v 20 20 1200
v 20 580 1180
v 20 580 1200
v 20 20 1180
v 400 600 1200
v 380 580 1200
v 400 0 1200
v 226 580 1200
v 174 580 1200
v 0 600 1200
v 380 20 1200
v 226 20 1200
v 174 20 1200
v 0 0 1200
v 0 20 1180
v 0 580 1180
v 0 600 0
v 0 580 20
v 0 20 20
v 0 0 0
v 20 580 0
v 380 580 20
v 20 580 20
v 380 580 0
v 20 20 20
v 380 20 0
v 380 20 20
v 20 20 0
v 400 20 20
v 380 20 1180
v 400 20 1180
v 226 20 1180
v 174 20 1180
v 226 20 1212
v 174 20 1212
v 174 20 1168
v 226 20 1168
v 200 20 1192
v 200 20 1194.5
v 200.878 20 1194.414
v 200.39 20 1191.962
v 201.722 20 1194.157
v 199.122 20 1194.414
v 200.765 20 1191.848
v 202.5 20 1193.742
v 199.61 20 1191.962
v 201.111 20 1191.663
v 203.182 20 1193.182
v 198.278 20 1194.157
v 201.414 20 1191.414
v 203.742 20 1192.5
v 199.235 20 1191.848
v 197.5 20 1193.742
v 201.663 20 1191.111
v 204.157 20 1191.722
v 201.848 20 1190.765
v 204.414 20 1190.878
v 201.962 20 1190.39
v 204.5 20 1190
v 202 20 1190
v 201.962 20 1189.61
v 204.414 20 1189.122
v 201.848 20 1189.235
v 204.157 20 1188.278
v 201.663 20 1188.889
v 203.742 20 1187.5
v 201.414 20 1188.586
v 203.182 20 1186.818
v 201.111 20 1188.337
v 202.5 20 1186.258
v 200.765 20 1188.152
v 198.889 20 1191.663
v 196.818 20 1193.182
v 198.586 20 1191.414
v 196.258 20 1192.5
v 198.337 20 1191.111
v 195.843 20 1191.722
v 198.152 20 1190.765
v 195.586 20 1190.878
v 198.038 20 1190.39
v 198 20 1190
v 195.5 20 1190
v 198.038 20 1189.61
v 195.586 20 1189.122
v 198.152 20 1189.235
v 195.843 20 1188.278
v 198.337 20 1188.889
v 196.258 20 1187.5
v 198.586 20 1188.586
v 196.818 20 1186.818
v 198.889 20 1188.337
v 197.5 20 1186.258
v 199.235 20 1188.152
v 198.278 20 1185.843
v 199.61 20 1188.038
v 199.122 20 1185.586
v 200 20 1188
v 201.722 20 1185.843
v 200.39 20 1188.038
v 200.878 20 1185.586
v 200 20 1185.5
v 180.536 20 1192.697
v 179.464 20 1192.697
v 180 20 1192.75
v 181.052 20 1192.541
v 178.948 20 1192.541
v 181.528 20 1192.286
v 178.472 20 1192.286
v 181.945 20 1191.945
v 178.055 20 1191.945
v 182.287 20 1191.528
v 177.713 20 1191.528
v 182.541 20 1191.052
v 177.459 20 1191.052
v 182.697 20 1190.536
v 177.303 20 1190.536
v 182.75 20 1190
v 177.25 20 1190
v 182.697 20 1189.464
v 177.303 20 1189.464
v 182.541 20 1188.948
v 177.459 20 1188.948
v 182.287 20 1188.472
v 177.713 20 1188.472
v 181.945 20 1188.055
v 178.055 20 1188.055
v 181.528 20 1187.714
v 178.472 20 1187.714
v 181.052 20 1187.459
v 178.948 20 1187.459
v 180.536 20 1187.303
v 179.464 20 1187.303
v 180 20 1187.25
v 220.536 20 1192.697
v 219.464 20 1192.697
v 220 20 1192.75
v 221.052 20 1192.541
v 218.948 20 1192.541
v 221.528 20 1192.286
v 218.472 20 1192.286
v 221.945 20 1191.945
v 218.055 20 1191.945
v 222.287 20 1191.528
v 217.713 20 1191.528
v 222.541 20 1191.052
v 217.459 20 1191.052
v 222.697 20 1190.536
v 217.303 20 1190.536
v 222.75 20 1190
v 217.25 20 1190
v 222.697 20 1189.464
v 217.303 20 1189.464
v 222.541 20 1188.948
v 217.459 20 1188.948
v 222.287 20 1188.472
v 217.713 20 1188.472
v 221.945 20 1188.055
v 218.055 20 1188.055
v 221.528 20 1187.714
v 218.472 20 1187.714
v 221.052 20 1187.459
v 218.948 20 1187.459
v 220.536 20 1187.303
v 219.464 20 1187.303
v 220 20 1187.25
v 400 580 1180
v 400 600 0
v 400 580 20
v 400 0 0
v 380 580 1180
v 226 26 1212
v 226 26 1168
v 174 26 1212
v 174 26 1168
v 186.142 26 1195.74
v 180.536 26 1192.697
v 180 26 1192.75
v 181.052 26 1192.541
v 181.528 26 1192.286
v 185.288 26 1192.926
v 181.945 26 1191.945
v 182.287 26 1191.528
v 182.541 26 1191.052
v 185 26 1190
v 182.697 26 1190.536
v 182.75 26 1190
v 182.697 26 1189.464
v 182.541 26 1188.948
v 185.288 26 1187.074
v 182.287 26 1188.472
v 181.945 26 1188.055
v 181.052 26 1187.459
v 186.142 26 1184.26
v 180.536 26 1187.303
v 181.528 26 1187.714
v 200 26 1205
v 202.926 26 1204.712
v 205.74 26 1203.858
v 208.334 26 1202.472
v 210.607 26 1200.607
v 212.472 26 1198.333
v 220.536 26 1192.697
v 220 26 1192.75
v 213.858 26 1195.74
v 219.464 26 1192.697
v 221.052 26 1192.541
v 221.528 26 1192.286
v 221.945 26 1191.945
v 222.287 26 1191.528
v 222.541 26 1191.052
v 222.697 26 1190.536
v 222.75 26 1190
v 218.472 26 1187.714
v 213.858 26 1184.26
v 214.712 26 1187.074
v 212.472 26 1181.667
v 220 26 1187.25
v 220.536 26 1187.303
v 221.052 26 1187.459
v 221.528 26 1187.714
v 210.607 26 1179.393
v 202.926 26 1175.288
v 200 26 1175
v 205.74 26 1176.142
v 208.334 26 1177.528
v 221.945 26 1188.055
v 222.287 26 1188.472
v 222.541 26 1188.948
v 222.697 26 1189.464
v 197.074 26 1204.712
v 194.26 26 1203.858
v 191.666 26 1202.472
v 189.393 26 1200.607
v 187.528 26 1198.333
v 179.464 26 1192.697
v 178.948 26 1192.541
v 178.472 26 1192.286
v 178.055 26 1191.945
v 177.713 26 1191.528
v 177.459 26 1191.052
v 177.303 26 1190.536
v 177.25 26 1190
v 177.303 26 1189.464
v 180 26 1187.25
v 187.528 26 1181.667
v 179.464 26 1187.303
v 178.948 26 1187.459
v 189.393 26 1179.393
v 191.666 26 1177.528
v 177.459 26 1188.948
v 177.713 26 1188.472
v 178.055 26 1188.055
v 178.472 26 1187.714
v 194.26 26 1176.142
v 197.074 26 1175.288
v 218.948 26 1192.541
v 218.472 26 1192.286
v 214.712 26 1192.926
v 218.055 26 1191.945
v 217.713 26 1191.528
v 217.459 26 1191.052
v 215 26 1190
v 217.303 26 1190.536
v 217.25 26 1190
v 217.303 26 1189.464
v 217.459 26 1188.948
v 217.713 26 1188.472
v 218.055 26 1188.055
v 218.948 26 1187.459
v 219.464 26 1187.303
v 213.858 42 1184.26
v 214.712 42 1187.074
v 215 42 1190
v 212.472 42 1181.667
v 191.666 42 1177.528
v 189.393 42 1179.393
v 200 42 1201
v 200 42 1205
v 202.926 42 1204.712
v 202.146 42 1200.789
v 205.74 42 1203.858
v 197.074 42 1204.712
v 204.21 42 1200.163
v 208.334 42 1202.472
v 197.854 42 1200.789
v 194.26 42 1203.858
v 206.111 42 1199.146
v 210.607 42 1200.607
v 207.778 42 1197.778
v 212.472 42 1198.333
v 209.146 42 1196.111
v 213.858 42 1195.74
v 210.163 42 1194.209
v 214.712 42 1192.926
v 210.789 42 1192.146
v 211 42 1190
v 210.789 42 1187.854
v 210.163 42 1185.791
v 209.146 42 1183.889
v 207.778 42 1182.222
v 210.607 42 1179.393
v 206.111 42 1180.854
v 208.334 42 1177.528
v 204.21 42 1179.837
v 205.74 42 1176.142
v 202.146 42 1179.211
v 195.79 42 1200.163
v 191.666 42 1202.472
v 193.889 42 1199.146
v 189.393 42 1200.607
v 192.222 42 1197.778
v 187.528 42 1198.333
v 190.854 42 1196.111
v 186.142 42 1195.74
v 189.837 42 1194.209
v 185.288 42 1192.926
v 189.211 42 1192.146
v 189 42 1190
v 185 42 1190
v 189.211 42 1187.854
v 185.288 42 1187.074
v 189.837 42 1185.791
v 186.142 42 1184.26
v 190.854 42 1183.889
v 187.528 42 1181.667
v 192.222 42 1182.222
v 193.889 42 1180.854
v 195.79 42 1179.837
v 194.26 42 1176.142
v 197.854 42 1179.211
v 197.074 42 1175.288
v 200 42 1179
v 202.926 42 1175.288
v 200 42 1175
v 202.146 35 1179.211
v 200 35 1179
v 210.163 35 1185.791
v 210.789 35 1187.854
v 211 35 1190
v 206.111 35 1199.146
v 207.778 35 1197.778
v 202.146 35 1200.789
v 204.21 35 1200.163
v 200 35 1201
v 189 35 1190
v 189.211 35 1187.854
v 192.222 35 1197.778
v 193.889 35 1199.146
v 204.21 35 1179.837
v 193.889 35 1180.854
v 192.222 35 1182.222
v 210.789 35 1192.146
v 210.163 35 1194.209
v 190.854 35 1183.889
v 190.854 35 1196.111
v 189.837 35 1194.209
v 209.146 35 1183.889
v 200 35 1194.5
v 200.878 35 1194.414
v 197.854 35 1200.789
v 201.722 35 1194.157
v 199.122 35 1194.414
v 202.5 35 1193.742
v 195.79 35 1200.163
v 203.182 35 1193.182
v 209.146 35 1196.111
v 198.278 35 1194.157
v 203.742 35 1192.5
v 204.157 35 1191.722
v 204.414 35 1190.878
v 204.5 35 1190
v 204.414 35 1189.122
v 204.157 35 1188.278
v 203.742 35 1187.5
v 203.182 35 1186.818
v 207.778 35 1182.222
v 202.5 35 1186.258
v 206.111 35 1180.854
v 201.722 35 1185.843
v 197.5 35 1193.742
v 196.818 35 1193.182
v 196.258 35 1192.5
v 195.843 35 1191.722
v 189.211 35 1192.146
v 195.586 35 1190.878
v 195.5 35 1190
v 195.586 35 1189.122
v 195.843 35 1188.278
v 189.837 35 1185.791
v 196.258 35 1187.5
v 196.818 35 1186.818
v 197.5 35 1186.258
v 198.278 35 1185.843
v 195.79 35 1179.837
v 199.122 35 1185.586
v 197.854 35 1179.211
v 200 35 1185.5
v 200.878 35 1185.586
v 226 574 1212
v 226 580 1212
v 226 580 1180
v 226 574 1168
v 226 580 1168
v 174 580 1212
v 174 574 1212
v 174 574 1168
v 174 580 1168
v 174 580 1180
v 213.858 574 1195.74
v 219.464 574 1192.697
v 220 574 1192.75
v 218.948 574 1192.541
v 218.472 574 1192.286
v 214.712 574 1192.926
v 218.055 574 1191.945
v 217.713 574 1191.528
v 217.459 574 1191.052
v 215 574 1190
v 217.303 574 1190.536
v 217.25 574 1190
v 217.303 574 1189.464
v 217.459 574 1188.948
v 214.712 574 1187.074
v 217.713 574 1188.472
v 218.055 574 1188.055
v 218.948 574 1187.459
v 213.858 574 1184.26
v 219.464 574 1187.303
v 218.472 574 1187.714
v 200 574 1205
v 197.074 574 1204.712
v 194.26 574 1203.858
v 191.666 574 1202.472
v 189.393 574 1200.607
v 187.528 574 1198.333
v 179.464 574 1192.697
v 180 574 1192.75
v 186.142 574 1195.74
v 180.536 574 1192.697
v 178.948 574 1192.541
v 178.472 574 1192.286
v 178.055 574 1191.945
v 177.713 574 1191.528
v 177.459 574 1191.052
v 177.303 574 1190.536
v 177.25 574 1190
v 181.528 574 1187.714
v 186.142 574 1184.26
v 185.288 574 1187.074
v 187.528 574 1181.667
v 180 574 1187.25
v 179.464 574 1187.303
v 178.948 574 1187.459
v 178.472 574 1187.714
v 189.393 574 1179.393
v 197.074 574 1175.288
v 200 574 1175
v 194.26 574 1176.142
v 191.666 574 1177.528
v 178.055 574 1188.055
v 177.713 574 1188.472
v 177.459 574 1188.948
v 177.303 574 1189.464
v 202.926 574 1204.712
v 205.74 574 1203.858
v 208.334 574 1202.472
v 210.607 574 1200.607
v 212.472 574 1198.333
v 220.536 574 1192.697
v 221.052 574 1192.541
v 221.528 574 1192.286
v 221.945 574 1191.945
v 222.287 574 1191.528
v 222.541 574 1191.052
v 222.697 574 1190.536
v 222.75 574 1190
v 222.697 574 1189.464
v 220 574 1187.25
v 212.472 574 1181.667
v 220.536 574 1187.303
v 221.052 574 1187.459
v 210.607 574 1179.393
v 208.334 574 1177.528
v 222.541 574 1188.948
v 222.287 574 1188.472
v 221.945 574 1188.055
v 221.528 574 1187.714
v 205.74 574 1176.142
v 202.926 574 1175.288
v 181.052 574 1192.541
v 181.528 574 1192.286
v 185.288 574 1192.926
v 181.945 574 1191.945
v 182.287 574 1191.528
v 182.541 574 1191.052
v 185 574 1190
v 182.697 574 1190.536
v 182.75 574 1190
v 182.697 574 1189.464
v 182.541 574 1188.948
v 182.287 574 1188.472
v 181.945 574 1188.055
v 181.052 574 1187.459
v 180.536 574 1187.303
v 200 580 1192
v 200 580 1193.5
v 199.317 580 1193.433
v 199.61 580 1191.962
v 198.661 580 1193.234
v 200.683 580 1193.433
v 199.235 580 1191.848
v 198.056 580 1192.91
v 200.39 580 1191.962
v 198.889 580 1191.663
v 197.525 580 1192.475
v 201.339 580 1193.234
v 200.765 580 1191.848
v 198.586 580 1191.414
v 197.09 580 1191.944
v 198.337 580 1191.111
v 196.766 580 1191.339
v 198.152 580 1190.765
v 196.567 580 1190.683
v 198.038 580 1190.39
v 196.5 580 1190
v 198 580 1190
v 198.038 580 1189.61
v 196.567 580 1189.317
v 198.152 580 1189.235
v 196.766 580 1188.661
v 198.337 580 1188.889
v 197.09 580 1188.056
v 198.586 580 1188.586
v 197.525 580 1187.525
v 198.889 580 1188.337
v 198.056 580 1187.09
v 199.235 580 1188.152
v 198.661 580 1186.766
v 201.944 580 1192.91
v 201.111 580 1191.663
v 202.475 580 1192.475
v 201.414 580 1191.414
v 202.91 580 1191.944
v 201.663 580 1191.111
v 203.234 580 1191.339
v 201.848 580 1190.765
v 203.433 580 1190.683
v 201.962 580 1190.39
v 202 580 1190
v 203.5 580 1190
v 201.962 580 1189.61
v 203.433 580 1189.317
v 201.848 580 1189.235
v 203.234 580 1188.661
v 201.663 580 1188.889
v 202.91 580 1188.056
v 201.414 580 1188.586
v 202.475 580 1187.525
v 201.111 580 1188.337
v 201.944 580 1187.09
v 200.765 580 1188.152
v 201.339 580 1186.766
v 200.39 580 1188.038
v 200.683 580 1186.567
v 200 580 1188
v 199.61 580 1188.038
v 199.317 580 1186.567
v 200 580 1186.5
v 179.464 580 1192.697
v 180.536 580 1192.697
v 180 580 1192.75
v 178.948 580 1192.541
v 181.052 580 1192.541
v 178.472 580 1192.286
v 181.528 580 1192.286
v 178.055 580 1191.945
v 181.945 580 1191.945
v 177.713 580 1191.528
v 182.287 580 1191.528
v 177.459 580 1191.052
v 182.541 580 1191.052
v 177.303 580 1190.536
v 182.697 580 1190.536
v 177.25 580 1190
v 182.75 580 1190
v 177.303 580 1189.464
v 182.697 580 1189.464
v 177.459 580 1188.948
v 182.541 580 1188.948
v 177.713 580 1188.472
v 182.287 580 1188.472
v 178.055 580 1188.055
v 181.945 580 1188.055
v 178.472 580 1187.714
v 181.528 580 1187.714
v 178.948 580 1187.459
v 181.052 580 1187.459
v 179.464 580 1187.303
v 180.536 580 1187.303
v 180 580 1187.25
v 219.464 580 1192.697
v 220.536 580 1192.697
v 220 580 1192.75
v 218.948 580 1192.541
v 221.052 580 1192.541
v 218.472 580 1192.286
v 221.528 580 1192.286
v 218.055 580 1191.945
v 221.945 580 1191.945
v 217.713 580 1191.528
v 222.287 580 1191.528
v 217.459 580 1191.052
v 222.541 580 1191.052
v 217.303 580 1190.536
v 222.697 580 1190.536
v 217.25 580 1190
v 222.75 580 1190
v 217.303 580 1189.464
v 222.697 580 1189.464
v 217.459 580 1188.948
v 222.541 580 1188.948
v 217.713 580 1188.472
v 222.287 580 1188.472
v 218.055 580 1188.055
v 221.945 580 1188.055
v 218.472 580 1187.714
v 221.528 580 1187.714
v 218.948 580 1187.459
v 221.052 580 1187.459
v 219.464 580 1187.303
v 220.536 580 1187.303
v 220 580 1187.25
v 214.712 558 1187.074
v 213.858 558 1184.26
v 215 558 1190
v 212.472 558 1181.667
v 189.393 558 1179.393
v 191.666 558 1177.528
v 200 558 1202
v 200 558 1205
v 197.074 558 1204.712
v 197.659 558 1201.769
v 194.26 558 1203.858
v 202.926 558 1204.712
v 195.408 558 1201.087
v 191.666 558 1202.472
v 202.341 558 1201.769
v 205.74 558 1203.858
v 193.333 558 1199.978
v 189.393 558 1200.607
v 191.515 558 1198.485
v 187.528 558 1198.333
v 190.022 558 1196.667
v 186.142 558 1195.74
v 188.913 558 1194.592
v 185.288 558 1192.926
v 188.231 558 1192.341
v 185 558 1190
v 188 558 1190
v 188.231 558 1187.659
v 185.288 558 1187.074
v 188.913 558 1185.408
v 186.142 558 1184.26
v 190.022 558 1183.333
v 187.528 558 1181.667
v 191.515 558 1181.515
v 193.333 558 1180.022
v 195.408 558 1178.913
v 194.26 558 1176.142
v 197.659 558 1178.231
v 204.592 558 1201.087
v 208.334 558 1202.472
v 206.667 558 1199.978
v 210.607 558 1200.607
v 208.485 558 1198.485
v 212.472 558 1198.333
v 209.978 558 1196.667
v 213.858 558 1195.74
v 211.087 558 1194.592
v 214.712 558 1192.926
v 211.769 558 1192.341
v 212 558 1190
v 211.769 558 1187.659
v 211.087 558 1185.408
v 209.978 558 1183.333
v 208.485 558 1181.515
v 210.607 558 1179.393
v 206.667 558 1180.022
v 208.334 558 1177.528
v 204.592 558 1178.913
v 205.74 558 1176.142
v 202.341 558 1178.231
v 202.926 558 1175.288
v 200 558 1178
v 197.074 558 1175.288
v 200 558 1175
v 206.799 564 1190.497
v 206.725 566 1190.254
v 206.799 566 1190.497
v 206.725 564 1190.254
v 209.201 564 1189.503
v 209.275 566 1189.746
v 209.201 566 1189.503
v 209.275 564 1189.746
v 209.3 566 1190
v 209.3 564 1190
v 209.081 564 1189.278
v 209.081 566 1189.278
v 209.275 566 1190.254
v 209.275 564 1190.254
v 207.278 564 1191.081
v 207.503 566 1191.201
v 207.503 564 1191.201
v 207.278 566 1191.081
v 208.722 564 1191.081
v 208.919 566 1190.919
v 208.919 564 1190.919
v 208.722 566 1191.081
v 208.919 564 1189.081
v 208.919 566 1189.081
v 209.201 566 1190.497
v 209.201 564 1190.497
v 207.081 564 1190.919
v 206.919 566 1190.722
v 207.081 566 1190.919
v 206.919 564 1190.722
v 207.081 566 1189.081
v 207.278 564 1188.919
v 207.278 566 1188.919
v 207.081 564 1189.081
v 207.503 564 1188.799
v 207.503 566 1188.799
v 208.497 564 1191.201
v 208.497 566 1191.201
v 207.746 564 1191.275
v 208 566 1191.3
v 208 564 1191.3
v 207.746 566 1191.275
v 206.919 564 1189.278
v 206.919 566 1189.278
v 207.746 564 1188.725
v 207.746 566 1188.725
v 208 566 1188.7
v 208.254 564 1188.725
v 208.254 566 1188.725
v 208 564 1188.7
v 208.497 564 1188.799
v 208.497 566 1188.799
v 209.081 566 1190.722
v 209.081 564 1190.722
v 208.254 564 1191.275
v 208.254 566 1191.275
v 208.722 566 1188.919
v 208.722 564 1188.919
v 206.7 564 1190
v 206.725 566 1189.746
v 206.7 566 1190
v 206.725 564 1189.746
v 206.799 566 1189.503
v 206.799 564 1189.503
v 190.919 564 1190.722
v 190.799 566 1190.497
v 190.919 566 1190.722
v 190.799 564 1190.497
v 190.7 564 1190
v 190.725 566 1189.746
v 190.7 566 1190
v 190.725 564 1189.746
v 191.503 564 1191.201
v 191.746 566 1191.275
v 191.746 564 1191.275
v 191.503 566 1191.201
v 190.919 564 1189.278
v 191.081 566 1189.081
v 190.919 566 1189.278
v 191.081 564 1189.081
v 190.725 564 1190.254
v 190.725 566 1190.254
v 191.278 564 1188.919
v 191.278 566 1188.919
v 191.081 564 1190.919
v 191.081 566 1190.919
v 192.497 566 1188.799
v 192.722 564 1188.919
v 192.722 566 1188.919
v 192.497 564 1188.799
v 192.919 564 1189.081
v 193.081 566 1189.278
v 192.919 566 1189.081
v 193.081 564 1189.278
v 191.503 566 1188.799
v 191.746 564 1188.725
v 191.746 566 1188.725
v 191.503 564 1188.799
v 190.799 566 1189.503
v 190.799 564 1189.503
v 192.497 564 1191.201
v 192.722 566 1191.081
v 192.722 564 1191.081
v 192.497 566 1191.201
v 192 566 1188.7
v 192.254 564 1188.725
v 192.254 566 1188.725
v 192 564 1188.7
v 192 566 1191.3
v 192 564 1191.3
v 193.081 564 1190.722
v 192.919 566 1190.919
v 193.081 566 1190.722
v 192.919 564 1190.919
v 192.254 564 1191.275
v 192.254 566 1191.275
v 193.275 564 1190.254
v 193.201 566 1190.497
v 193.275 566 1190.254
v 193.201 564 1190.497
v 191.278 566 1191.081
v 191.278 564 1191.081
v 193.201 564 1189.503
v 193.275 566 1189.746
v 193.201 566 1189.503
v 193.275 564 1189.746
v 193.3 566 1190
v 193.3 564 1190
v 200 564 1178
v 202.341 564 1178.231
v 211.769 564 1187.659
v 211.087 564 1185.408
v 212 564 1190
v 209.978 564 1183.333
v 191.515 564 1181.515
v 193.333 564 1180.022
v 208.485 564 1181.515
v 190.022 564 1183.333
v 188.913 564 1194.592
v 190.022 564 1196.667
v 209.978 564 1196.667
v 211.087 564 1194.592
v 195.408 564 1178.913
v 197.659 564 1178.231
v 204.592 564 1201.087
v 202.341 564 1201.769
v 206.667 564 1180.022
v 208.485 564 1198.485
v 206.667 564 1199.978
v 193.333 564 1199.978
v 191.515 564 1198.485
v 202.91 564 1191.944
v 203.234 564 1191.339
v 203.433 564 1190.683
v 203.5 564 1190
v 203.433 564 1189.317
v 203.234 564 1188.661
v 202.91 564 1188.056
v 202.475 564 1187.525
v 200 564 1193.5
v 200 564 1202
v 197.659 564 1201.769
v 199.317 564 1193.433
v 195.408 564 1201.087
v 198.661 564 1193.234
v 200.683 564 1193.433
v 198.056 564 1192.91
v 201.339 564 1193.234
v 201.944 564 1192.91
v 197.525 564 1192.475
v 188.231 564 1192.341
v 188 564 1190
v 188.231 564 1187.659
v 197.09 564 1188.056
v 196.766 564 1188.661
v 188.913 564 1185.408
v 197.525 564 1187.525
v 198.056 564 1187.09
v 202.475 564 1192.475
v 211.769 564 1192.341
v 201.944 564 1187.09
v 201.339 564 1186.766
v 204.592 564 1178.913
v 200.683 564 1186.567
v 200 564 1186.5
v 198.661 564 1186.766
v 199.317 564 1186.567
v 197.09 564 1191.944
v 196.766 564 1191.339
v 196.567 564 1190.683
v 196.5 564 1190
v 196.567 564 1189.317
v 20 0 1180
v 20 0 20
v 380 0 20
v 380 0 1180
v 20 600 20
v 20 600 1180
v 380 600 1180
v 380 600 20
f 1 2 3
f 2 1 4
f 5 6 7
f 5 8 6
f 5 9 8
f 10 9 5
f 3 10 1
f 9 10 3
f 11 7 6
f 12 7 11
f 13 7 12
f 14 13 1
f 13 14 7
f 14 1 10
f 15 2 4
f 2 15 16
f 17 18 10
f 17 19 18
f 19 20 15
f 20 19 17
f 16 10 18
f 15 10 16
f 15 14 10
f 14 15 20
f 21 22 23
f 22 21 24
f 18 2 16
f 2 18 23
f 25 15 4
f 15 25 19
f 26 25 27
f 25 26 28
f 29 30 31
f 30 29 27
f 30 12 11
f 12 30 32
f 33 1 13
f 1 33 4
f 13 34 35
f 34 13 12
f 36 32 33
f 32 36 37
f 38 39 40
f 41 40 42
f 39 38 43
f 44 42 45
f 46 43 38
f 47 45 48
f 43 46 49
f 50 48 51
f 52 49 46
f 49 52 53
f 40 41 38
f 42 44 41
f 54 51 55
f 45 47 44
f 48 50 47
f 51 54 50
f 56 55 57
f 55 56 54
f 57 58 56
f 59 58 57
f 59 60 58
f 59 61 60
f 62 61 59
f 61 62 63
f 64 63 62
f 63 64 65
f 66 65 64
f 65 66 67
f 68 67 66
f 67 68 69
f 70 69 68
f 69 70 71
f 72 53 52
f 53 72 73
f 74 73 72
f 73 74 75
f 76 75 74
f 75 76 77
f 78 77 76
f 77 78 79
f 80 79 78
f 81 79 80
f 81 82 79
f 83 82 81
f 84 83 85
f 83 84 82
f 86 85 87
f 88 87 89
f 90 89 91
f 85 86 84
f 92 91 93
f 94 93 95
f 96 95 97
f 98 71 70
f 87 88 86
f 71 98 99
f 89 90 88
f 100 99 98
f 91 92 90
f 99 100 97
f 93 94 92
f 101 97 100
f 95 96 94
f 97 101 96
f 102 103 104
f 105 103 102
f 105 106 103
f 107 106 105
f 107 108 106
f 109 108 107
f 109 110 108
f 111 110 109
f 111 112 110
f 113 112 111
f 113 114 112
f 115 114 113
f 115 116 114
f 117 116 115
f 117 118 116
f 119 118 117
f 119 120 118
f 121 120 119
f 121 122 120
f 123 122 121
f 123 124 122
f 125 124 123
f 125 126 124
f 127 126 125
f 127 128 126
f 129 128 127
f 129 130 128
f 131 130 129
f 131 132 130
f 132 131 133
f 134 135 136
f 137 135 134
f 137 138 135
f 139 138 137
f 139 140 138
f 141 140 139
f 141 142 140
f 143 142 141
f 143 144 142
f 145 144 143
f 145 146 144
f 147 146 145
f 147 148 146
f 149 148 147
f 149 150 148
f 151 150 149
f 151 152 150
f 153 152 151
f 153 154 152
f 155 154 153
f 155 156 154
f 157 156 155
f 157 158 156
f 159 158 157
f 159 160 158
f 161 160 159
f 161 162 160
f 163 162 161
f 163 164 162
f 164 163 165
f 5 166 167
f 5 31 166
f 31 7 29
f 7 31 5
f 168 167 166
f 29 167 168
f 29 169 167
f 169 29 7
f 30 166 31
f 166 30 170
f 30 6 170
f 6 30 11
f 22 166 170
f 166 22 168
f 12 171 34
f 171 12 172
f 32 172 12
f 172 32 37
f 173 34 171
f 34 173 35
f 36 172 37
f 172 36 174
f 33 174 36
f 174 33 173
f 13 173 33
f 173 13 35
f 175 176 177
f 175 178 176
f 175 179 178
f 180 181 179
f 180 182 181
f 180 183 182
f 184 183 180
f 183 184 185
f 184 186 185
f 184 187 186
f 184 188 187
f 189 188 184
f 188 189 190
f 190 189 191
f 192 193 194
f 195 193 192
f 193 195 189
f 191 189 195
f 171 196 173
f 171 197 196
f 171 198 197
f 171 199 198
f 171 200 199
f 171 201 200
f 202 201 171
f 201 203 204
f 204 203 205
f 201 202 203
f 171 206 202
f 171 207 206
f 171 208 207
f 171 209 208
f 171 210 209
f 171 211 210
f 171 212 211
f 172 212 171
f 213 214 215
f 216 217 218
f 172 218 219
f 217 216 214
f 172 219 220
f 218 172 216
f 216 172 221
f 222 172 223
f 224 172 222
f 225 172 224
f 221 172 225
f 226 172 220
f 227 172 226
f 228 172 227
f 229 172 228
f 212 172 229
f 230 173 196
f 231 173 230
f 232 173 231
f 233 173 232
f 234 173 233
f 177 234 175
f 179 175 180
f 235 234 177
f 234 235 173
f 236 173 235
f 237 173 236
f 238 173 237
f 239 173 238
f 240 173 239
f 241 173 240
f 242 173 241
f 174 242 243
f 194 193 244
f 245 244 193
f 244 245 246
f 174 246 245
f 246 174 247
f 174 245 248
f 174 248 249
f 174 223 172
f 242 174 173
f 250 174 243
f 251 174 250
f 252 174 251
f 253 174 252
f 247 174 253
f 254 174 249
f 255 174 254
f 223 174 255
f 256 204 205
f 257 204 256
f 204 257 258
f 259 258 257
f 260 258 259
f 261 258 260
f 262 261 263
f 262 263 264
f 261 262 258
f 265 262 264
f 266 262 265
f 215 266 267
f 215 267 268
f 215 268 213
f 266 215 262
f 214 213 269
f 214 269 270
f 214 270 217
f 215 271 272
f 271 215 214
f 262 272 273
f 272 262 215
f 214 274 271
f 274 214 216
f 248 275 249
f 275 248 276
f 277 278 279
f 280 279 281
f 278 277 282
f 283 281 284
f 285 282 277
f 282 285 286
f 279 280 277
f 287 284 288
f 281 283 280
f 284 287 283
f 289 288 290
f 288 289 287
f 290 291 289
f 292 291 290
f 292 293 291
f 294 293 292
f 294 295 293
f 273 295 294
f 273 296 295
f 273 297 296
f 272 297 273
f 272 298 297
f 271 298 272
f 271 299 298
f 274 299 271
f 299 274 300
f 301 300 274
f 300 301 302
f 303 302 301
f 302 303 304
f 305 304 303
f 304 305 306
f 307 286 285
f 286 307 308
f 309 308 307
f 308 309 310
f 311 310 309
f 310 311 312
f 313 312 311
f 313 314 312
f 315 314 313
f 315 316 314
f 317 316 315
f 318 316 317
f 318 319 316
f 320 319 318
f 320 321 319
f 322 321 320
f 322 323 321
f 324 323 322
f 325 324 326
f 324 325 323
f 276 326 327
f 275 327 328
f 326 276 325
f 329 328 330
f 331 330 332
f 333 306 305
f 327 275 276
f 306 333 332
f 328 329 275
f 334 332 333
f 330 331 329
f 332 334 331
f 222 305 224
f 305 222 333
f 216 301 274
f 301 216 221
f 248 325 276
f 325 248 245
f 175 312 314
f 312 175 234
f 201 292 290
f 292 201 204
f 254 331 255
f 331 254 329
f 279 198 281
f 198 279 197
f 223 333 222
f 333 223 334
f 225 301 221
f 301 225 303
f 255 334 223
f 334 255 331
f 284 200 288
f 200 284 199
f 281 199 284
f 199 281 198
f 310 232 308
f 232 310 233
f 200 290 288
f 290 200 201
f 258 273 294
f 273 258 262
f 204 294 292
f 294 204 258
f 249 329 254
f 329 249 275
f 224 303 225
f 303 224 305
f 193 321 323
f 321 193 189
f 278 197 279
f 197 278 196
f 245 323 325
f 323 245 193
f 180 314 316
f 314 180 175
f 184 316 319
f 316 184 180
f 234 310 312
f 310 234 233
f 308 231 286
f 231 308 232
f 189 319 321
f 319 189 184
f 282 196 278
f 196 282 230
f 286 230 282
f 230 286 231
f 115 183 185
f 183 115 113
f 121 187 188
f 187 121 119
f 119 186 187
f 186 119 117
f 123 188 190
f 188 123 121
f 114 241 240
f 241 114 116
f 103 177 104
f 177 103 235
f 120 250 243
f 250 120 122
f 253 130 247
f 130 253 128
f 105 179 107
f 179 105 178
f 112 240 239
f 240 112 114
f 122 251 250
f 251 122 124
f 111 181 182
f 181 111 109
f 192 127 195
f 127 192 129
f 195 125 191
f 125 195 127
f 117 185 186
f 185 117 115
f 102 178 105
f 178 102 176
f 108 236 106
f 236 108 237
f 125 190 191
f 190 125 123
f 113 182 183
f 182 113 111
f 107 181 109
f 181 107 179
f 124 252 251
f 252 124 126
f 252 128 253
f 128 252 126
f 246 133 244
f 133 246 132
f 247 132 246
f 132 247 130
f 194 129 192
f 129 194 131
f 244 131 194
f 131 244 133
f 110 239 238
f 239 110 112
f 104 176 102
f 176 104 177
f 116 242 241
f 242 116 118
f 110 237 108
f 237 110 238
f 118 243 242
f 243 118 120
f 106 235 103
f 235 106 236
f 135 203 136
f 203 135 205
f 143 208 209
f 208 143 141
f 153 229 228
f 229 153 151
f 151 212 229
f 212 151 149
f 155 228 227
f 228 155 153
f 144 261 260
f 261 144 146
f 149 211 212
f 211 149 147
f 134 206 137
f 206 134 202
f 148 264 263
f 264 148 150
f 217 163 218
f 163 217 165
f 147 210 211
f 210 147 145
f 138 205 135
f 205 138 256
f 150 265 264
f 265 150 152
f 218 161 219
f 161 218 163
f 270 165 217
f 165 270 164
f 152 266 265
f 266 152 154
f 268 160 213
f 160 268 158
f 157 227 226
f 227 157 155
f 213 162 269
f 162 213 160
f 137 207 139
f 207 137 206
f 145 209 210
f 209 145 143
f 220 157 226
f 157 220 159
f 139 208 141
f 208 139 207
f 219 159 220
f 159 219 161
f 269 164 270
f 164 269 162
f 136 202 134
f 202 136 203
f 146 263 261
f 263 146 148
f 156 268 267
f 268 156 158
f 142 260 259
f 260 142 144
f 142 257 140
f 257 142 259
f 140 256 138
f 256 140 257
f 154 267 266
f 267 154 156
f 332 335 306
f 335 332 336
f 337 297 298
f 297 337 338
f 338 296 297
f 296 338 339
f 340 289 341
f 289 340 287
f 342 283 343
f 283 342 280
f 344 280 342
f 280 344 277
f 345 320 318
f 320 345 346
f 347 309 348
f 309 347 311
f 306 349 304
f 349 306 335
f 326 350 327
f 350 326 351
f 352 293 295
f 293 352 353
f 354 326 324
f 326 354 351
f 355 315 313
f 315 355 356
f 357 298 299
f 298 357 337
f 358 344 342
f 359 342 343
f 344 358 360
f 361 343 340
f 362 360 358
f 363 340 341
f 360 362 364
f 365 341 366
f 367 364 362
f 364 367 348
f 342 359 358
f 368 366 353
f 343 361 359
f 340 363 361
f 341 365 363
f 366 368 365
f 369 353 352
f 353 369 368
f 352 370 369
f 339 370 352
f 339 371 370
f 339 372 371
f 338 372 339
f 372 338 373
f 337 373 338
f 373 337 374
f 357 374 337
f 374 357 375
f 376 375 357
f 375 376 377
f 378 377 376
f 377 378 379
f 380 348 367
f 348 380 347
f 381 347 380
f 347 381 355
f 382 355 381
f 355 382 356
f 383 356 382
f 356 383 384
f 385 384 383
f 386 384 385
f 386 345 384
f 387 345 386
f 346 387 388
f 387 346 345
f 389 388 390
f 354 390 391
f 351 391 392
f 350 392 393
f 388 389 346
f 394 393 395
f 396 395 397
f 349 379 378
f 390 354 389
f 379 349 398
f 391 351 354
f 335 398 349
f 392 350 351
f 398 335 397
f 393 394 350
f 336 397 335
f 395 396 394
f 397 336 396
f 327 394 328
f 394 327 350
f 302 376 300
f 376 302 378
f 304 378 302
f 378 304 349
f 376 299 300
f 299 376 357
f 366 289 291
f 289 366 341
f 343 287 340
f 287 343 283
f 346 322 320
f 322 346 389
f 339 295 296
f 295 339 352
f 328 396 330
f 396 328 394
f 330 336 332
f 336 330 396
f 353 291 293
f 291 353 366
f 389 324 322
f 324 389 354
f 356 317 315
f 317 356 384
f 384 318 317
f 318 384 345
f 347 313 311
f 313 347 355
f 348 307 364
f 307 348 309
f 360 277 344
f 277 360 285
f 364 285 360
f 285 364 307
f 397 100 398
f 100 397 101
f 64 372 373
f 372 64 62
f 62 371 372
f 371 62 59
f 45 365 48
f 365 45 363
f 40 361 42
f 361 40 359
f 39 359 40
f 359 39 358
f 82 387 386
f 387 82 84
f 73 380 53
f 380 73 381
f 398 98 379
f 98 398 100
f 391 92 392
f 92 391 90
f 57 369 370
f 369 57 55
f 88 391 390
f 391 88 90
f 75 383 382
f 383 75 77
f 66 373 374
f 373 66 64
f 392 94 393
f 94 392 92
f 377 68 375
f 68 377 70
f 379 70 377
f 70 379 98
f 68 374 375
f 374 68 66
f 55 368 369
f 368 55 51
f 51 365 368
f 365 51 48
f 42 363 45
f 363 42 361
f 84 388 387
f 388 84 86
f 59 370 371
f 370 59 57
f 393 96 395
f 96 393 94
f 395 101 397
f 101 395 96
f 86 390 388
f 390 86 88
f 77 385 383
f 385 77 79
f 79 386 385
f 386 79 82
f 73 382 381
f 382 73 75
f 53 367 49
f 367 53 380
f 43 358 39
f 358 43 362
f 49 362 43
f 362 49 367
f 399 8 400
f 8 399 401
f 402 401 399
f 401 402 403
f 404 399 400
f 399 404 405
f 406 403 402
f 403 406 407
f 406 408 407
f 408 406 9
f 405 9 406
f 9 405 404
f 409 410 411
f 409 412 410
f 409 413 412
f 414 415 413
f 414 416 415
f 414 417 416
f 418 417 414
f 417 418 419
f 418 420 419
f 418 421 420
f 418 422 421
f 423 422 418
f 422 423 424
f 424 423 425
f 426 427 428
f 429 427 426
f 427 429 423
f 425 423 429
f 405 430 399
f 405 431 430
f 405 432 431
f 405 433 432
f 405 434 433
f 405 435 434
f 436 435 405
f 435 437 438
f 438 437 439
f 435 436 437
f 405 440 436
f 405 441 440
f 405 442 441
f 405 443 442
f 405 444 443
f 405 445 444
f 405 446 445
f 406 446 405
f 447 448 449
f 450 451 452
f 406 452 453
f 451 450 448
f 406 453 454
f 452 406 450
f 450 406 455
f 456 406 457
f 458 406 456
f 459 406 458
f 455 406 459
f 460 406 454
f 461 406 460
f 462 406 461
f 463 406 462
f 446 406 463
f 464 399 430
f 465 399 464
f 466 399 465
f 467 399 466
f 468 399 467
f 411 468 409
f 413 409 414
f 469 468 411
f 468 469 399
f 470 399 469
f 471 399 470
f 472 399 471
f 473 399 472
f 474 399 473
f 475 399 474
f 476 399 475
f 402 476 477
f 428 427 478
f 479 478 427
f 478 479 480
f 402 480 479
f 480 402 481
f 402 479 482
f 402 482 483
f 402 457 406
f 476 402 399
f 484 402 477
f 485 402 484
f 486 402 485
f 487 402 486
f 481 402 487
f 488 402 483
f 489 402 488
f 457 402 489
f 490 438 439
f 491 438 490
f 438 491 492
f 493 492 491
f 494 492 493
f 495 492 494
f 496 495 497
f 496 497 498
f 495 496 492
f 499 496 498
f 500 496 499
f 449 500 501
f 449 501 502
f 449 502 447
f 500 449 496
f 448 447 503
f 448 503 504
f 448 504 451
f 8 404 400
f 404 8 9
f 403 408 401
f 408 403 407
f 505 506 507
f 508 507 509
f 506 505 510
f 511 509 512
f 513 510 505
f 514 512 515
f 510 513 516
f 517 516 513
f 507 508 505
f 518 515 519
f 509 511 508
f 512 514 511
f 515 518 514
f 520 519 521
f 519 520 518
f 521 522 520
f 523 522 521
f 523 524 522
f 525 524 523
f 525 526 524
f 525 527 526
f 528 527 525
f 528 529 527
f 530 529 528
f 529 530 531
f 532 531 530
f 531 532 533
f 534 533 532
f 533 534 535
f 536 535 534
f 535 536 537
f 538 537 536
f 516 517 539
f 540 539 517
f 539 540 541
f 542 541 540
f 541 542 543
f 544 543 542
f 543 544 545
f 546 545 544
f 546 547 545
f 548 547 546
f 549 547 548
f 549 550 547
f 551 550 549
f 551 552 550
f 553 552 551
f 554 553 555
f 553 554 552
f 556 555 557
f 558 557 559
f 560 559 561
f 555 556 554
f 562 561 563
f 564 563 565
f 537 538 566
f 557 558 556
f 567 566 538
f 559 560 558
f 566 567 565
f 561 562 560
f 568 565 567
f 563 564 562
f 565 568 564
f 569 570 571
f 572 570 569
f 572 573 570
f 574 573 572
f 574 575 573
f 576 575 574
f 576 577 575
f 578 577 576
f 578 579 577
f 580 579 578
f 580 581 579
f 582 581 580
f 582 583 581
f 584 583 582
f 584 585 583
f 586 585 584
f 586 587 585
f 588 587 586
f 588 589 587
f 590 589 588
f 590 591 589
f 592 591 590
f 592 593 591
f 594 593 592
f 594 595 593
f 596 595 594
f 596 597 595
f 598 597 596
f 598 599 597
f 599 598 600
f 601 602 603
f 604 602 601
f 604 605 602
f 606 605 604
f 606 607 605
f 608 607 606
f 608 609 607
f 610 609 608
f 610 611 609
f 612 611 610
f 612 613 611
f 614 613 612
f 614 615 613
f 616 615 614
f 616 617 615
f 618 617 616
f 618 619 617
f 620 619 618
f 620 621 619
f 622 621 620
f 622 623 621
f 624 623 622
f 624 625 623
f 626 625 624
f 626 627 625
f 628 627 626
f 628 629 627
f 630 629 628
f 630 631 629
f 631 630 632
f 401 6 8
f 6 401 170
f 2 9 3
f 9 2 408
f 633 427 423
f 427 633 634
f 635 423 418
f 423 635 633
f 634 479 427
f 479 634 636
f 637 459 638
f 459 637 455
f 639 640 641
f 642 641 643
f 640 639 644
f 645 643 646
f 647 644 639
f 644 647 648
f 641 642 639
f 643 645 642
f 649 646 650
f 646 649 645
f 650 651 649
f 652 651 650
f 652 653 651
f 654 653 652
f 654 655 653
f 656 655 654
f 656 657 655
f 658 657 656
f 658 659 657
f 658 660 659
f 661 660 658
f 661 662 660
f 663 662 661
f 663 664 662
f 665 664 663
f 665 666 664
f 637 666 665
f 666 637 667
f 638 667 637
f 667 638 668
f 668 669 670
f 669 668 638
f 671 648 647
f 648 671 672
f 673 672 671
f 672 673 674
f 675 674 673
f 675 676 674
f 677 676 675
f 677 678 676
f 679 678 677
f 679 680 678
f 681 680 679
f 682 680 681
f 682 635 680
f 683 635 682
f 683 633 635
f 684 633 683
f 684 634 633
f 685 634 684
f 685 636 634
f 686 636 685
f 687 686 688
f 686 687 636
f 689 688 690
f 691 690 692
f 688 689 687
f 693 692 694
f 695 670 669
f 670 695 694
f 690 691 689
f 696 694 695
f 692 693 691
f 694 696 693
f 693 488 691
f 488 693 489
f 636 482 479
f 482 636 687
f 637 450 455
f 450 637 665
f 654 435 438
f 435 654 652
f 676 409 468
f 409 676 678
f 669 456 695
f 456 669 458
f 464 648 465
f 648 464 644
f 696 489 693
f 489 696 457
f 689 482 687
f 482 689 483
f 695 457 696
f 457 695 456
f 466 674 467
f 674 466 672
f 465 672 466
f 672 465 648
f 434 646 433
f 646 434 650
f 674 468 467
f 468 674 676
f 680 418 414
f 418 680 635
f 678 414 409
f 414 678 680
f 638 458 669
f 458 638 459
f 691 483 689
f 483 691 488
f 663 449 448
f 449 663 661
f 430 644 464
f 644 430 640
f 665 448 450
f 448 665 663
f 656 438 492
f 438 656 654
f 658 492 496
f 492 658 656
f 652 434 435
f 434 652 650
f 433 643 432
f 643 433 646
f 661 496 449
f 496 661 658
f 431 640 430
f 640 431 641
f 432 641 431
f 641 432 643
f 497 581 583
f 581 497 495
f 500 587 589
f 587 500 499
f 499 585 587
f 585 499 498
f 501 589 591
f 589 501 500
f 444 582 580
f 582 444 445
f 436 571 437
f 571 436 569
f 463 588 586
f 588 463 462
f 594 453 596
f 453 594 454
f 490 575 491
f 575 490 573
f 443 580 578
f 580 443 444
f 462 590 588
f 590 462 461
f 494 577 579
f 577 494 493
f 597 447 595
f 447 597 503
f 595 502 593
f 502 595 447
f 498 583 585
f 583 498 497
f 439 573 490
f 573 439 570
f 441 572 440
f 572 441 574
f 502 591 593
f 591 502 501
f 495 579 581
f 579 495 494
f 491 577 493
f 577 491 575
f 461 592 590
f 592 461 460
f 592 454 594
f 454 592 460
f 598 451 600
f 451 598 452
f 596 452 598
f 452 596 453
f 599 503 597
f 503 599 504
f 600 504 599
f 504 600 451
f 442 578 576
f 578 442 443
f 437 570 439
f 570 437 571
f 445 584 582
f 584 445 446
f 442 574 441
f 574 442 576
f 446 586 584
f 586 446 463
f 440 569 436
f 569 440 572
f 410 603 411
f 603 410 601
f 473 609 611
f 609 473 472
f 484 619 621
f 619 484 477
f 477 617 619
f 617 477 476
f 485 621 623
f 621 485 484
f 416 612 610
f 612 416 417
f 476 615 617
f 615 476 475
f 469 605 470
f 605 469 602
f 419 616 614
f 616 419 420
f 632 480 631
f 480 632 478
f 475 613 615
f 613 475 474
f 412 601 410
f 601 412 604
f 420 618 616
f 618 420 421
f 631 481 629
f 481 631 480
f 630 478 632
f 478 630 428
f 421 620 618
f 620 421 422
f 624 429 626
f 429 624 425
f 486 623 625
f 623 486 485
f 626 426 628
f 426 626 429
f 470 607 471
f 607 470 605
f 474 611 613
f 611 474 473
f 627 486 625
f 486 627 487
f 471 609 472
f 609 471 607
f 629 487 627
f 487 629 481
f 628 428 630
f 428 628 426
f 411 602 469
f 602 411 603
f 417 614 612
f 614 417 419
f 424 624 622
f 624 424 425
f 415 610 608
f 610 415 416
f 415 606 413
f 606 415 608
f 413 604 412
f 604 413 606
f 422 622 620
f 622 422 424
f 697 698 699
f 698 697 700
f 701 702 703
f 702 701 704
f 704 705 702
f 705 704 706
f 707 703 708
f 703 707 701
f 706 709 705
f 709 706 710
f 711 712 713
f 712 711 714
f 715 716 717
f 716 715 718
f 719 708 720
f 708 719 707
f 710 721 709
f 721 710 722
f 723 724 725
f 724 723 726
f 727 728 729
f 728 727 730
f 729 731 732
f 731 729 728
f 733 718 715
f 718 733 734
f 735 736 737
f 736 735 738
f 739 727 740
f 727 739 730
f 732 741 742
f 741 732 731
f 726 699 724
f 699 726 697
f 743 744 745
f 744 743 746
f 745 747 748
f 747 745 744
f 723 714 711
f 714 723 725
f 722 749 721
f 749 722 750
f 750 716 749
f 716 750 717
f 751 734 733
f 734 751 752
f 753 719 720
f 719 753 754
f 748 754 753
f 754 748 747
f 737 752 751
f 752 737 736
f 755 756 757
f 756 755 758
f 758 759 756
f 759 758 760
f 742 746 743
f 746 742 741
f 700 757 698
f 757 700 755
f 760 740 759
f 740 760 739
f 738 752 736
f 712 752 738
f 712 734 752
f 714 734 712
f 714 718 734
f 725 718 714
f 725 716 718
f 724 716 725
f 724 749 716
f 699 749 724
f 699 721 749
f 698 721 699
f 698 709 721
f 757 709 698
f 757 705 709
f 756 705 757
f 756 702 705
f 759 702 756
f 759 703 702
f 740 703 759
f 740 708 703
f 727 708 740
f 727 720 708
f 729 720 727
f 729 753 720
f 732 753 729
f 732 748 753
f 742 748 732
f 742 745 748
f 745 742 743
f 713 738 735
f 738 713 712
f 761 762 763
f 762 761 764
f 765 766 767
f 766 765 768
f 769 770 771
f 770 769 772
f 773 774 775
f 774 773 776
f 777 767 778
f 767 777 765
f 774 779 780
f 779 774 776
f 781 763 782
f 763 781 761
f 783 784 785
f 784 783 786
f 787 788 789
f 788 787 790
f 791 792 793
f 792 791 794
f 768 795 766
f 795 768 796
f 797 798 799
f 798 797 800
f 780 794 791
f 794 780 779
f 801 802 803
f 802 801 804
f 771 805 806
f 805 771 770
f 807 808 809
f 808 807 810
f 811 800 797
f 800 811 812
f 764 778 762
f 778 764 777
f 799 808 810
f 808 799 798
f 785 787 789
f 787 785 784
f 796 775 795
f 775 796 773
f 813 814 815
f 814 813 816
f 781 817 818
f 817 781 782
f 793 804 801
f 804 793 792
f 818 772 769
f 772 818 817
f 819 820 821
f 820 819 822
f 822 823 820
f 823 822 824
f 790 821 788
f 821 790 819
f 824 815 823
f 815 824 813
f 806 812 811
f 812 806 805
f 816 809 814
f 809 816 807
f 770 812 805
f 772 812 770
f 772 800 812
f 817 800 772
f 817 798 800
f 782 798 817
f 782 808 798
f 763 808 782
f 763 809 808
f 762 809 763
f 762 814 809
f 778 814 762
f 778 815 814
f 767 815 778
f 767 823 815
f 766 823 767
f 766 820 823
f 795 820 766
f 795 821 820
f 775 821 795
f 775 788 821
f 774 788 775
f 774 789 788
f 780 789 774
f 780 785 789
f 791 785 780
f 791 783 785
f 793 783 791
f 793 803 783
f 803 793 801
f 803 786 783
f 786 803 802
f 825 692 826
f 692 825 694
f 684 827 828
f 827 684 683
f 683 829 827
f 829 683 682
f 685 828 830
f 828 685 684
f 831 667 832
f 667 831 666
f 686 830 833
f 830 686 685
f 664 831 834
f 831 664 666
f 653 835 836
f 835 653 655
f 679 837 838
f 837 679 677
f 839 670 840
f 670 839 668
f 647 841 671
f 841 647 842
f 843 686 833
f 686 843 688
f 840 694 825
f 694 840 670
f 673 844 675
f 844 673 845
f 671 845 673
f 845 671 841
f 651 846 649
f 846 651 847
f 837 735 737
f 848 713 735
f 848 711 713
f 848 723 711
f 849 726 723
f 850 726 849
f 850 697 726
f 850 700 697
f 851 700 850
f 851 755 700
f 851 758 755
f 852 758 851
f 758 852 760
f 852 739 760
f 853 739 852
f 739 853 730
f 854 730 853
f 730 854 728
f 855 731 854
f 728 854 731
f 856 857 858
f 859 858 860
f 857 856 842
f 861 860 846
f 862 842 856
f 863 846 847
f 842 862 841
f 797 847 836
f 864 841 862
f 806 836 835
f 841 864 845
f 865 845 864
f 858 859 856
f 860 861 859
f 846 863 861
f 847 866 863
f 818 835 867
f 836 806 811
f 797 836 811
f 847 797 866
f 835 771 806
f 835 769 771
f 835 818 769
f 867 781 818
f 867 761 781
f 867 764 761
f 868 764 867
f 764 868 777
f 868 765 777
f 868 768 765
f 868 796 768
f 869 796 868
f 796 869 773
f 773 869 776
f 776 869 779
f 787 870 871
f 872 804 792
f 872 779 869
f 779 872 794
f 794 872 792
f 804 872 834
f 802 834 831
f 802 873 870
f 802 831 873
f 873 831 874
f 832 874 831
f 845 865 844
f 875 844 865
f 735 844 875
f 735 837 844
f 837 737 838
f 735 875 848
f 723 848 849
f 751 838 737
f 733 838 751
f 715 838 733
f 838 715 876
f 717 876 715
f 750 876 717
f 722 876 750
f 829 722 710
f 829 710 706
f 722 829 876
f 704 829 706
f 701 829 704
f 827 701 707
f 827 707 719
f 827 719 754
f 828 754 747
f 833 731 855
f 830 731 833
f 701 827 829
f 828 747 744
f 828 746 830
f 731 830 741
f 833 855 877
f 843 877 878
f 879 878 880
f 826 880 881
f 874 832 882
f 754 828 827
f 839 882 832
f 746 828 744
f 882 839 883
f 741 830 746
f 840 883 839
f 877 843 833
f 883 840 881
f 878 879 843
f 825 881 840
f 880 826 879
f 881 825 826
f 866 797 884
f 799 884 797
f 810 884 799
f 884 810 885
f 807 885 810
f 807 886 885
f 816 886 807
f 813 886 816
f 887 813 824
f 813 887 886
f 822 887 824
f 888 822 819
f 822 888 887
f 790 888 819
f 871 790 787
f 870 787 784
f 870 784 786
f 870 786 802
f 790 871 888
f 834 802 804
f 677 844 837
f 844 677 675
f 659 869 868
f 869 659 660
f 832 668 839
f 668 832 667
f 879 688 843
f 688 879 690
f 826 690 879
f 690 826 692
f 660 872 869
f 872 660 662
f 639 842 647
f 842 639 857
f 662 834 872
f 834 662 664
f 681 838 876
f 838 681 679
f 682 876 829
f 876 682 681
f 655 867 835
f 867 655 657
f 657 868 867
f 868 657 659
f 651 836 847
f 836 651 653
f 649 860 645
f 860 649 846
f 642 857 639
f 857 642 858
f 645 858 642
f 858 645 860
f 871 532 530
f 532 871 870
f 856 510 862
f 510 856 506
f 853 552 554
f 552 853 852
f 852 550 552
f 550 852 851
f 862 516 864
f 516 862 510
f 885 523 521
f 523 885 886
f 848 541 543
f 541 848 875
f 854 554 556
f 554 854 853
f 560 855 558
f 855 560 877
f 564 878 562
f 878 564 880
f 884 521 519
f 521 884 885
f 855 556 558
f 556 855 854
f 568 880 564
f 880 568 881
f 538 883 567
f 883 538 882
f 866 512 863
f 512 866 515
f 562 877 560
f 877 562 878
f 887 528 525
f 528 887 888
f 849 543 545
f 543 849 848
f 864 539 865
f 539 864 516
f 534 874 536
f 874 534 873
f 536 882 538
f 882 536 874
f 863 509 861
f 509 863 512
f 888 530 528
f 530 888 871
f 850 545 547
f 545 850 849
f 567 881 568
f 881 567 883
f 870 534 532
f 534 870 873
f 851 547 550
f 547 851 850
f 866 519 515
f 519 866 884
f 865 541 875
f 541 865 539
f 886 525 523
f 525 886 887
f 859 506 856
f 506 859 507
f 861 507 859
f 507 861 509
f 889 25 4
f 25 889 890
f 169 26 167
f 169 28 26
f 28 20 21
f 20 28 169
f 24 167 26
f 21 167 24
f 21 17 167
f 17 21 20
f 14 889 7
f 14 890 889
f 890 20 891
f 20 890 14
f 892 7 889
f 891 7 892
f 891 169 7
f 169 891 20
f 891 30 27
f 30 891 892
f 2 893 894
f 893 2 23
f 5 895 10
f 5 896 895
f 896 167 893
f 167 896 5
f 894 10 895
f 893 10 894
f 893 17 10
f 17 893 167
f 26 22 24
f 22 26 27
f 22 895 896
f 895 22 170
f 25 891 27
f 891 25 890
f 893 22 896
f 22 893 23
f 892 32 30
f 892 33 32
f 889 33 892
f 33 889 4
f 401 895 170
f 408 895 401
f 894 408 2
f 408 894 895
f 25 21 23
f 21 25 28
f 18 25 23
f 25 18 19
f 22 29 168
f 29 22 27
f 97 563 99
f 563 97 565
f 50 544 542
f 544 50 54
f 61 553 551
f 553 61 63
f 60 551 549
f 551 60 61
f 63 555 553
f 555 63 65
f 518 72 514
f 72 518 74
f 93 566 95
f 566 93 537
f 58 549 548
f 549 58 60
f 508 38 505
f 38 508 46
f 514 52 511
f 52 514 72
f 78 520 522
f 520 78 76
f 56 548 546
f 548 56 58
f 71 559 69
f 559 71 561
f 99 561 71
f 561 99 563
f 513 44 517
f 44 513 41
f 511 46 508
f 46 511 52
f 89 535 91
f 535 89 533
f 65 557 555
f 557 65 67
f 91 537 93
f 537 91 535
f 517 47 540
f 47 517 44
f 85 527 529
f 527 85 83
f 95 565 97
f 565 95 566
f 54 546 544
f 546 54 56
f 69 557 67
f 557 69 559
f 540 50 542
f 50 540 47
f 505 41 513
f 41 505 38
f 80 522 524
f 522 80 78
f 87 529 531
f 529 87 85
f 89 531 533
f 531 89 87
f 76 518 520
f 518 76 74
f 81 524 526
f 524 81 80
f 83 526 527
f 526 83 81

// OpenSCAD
// =====================================================================
//  슬랙라인 균형 로봇 — 프레임 v1  (2026-07-08)
//  2020 알루미늄 프로파일 직육면체, 상단 60cm(Y방향) 레일 2개 제거
// ---------------------------------------------------------------------
//  좌표 규약 (단위: mm)
//    X = 깊이(앞뒤)      = 400  (40 cm)
//    Y = 피벗 이격 방향  = 600  (60 cm)
//    Z = 높이           = 1200 (120 cm)
//  모든 회전은 Y축. 상단에 남는 두 개의 X방향 레일 중앙이 피벗 자리
//  (두 피벗은 Y로 ~60cm 이격, 회전축은 Y와 평행).
// =====================================================================

// ---------------- 파라미터 ----------------
P  = 20;      // 2020 프로파일 단면 한 변 [mm]
X  = 400;     // 깊이
Y  = 600;     // 피벗 이격 방향
Z  = 1200;    // 높이
$fn = 32;

show_removed_ghost = true;  // 제거한 상단 60cm 2개를 반투명으로 표시
show_pivot_axis    = true;  // 피벗 축(Y) 시각화

// 파생 길이 (기둥 사이에 들어가는 가로재 길이)
xrail_len = X - 2*P;   // X방향 레일 = 360
yrail_len = Y - 2*P;   // Y방향 레일 = 560 (상단 이 2개를 제거)

// ---------------- 프로파일 모듈 (단순화: 20x20 solid) ----------------
module post()  color("silver") cube([P, P, Z]);           // 수직 기둥 (Z)
module xrail() color("silver") cube([xrail_len, P, P]);    // X방향 가로재
module yrail() color("silver") cube([P, yrail_len, P]);    // Y방향 가로재

// =====================================================================
//  조립
// =====================================================================

// ---- 1) 수직 기둥 4개 (모서리, 전체 높이) ----
translate([0,   0,   0]) post();
translate([X-P, 0,   0]) post();
translate([0,   Y-P, 0]) post();
translate([X-P, Y-P, 0]) post();

// ---- 2) X방향 가로재 (기둥 사이) ----
//  하단 2개
translate([P, 0,   0  ]) xrail();
translate([P, Y-P, 0  ]) xrail();
//  상단 2개 (★유지 — 이 두 레일의 중앙이 피벗 자리)
translate([P, 0,   Z-P]) xrail();
translate([P, Y-P, Z-P]) xrail();

// ---- 3) Y방향 가로재 (기둥 사이) ----
//  하단 2개
translate([0,   P, 0  ]) yrail();
translate([X-P, P, 0  ]) yrail();
//  상단 2개 → ★제거 (요청: 상단 60cm 프로파일 2개 제거)
//  translate([0,   P, Z-P]) yrail();
//  translate([X-P, P, Z-P]) yrail();

// ---- (옵션) 제거한 상단 Y레일을 반투명 유령으로 표시 ----
if (show_removed_ghost) {
    color([1,0,0,0.20]) translate([0,   P, Z-P]) yrail();
    color([1,0,0,0.20]) translate([X-P, P, Z-P]) yrail();
}

// ---- (옵션) 피벗 축(Y방향) 시각화 ----
//  상단 두 X레일 중앙(X/2)을 잇는 Y축 = 줄이 매달려 회전하는 축
if (show_pivot_axis) {
    pz = Z - P/2;
    color([1,0.4,0,0.4])
        translate([X/2, P/2, pz]) rotate([-90,0,0]) cylinder(h = Y - P, r = 2);
    // (피벗 위치에는 아래 베어링/엔코더 마운트가 놓임)
}

echo(str("Frame  X=", X/10, "cm  Y=", Y/10, "cm  Z=", Z/10, "cm"));
echo(str("남은 상단 레일 = X방향 2개 (각 ", xrail_len/10, "cm), 피벗 이격 = Y ~", (Y-P)/10, "cm"));
echo("상단 Y방향 60cm 레일 2개 제거됨");

// =====================================================================
//  피벗 마운트 — 앞쪽(y≈P)=베어링, 뒤쪽(y≈Y-P)=엔코더
//  로컬 좌표: 원점=회전축, 축=+Y(안쪽), 플레이트 뒷면=y=0(레일 안쪽 면에 밀착)
//  레일 안쪽 면 슬롯(z=축 중심선)에 M5 T너트로 체결
// =====================================================================
axis_z   = Z - P/2;        // 피벗 축 높이 = 상단 레일 중심 (1190)
plate_t  = 6;              // 마운트 플레이트 두께
plate_w  = 52;             // 플레이트 X폭
plate_h  = 44;             // 플레이트 Z높이
bolt_d   = 5.5;            // M5 통과홀
bolt_dx  = 20;            // 레일 볼트 X간격 (슬롯 중심선 z=0)

// ... (이하 생략하지 않고 전체 다 작성함)
brg_od = 22; brg_id = 8; brg_w = 7;
boss_od  = brg_od + 8;     // 30
boss_len = 16;             // 축방향 보스 길이

enc_body_d     = 24;       // 엔코더 몸체 안착경 (예시)
enc_body_depth = 6;
enc_shaft_d    = 7;        // 샤프트/자석 관통
enc_bolt_bc    = 16;       // 엔코더 볼트원 지름 (예시)

module bearing_mount() {
    difference() {
        union() {
            translate([-plate_w/2, 0, -plate_h/2]) cube([plate_w, plate_t, plate_h]);
            translate([0, plate_t, 0]) rotate([-90,0,0]) cylinder(h=boss_len, d=boss_od);
        }
        translate([0, plate_t+boss_len-brg_w, 0]) rotate([-90,0,0]) cylinder(h=brg_w+0.2, d=brg_od);
        translate([0,-1,0]) rotate([-90,0,0]) cylinder(h=plate_t+boss_len+2, d=brg_id+1);
        for (dx=[-bolt_dx,bolt_dx])
            translate([dx,-0.1,0]) rotate([-90,0,0]) cylinder(h=plate_t+0.2, d=bolt_d);
    }
}

module encoder_mount() {
    difference() {
        union() {
            translate([-plate_w/2, 0, -plate_h/2]) cube([plate_w, plate_t, plate_h]);
            translate([0, plate_t, 0]) rotate([-90,0,0]) cylinder(h=boss_len, d=boss_od);
        }
        translate([0, plate_t+boss_len-enc_body_depth, 0]) rotate([-90,0,0]) cylinder(h=enc_body_depth+0.2, d=enc_body_d);
        translate([0,-1,0]) rotate([-90,0,0]) cylinder(h=plate_t+boss_len+2, d=enc_shaft_d);
        for (a=[0,180])
            rotate([0,a,0]) translate([enc_bolt_bc/2, plate_t+boss_len-enc_body_depth-2, 0])
                rotate([-90,0,0]) cylinder(h=enc_body_depth+4, d=2.6);
        for (dx=[-bolt_dx,bolt_dx])
            translate([dx,-0.1,0]) rotate([-90,0,0]) cylinder(h=plate_t+0.2, d=bolt_d);
    }
}

color("orange") translate([X/2, P,   axis_z]) bearing_mount();
color("green")  translate([X/2, Y-P, axis_z]) mirror([0,1,0]) encoder_mount();
